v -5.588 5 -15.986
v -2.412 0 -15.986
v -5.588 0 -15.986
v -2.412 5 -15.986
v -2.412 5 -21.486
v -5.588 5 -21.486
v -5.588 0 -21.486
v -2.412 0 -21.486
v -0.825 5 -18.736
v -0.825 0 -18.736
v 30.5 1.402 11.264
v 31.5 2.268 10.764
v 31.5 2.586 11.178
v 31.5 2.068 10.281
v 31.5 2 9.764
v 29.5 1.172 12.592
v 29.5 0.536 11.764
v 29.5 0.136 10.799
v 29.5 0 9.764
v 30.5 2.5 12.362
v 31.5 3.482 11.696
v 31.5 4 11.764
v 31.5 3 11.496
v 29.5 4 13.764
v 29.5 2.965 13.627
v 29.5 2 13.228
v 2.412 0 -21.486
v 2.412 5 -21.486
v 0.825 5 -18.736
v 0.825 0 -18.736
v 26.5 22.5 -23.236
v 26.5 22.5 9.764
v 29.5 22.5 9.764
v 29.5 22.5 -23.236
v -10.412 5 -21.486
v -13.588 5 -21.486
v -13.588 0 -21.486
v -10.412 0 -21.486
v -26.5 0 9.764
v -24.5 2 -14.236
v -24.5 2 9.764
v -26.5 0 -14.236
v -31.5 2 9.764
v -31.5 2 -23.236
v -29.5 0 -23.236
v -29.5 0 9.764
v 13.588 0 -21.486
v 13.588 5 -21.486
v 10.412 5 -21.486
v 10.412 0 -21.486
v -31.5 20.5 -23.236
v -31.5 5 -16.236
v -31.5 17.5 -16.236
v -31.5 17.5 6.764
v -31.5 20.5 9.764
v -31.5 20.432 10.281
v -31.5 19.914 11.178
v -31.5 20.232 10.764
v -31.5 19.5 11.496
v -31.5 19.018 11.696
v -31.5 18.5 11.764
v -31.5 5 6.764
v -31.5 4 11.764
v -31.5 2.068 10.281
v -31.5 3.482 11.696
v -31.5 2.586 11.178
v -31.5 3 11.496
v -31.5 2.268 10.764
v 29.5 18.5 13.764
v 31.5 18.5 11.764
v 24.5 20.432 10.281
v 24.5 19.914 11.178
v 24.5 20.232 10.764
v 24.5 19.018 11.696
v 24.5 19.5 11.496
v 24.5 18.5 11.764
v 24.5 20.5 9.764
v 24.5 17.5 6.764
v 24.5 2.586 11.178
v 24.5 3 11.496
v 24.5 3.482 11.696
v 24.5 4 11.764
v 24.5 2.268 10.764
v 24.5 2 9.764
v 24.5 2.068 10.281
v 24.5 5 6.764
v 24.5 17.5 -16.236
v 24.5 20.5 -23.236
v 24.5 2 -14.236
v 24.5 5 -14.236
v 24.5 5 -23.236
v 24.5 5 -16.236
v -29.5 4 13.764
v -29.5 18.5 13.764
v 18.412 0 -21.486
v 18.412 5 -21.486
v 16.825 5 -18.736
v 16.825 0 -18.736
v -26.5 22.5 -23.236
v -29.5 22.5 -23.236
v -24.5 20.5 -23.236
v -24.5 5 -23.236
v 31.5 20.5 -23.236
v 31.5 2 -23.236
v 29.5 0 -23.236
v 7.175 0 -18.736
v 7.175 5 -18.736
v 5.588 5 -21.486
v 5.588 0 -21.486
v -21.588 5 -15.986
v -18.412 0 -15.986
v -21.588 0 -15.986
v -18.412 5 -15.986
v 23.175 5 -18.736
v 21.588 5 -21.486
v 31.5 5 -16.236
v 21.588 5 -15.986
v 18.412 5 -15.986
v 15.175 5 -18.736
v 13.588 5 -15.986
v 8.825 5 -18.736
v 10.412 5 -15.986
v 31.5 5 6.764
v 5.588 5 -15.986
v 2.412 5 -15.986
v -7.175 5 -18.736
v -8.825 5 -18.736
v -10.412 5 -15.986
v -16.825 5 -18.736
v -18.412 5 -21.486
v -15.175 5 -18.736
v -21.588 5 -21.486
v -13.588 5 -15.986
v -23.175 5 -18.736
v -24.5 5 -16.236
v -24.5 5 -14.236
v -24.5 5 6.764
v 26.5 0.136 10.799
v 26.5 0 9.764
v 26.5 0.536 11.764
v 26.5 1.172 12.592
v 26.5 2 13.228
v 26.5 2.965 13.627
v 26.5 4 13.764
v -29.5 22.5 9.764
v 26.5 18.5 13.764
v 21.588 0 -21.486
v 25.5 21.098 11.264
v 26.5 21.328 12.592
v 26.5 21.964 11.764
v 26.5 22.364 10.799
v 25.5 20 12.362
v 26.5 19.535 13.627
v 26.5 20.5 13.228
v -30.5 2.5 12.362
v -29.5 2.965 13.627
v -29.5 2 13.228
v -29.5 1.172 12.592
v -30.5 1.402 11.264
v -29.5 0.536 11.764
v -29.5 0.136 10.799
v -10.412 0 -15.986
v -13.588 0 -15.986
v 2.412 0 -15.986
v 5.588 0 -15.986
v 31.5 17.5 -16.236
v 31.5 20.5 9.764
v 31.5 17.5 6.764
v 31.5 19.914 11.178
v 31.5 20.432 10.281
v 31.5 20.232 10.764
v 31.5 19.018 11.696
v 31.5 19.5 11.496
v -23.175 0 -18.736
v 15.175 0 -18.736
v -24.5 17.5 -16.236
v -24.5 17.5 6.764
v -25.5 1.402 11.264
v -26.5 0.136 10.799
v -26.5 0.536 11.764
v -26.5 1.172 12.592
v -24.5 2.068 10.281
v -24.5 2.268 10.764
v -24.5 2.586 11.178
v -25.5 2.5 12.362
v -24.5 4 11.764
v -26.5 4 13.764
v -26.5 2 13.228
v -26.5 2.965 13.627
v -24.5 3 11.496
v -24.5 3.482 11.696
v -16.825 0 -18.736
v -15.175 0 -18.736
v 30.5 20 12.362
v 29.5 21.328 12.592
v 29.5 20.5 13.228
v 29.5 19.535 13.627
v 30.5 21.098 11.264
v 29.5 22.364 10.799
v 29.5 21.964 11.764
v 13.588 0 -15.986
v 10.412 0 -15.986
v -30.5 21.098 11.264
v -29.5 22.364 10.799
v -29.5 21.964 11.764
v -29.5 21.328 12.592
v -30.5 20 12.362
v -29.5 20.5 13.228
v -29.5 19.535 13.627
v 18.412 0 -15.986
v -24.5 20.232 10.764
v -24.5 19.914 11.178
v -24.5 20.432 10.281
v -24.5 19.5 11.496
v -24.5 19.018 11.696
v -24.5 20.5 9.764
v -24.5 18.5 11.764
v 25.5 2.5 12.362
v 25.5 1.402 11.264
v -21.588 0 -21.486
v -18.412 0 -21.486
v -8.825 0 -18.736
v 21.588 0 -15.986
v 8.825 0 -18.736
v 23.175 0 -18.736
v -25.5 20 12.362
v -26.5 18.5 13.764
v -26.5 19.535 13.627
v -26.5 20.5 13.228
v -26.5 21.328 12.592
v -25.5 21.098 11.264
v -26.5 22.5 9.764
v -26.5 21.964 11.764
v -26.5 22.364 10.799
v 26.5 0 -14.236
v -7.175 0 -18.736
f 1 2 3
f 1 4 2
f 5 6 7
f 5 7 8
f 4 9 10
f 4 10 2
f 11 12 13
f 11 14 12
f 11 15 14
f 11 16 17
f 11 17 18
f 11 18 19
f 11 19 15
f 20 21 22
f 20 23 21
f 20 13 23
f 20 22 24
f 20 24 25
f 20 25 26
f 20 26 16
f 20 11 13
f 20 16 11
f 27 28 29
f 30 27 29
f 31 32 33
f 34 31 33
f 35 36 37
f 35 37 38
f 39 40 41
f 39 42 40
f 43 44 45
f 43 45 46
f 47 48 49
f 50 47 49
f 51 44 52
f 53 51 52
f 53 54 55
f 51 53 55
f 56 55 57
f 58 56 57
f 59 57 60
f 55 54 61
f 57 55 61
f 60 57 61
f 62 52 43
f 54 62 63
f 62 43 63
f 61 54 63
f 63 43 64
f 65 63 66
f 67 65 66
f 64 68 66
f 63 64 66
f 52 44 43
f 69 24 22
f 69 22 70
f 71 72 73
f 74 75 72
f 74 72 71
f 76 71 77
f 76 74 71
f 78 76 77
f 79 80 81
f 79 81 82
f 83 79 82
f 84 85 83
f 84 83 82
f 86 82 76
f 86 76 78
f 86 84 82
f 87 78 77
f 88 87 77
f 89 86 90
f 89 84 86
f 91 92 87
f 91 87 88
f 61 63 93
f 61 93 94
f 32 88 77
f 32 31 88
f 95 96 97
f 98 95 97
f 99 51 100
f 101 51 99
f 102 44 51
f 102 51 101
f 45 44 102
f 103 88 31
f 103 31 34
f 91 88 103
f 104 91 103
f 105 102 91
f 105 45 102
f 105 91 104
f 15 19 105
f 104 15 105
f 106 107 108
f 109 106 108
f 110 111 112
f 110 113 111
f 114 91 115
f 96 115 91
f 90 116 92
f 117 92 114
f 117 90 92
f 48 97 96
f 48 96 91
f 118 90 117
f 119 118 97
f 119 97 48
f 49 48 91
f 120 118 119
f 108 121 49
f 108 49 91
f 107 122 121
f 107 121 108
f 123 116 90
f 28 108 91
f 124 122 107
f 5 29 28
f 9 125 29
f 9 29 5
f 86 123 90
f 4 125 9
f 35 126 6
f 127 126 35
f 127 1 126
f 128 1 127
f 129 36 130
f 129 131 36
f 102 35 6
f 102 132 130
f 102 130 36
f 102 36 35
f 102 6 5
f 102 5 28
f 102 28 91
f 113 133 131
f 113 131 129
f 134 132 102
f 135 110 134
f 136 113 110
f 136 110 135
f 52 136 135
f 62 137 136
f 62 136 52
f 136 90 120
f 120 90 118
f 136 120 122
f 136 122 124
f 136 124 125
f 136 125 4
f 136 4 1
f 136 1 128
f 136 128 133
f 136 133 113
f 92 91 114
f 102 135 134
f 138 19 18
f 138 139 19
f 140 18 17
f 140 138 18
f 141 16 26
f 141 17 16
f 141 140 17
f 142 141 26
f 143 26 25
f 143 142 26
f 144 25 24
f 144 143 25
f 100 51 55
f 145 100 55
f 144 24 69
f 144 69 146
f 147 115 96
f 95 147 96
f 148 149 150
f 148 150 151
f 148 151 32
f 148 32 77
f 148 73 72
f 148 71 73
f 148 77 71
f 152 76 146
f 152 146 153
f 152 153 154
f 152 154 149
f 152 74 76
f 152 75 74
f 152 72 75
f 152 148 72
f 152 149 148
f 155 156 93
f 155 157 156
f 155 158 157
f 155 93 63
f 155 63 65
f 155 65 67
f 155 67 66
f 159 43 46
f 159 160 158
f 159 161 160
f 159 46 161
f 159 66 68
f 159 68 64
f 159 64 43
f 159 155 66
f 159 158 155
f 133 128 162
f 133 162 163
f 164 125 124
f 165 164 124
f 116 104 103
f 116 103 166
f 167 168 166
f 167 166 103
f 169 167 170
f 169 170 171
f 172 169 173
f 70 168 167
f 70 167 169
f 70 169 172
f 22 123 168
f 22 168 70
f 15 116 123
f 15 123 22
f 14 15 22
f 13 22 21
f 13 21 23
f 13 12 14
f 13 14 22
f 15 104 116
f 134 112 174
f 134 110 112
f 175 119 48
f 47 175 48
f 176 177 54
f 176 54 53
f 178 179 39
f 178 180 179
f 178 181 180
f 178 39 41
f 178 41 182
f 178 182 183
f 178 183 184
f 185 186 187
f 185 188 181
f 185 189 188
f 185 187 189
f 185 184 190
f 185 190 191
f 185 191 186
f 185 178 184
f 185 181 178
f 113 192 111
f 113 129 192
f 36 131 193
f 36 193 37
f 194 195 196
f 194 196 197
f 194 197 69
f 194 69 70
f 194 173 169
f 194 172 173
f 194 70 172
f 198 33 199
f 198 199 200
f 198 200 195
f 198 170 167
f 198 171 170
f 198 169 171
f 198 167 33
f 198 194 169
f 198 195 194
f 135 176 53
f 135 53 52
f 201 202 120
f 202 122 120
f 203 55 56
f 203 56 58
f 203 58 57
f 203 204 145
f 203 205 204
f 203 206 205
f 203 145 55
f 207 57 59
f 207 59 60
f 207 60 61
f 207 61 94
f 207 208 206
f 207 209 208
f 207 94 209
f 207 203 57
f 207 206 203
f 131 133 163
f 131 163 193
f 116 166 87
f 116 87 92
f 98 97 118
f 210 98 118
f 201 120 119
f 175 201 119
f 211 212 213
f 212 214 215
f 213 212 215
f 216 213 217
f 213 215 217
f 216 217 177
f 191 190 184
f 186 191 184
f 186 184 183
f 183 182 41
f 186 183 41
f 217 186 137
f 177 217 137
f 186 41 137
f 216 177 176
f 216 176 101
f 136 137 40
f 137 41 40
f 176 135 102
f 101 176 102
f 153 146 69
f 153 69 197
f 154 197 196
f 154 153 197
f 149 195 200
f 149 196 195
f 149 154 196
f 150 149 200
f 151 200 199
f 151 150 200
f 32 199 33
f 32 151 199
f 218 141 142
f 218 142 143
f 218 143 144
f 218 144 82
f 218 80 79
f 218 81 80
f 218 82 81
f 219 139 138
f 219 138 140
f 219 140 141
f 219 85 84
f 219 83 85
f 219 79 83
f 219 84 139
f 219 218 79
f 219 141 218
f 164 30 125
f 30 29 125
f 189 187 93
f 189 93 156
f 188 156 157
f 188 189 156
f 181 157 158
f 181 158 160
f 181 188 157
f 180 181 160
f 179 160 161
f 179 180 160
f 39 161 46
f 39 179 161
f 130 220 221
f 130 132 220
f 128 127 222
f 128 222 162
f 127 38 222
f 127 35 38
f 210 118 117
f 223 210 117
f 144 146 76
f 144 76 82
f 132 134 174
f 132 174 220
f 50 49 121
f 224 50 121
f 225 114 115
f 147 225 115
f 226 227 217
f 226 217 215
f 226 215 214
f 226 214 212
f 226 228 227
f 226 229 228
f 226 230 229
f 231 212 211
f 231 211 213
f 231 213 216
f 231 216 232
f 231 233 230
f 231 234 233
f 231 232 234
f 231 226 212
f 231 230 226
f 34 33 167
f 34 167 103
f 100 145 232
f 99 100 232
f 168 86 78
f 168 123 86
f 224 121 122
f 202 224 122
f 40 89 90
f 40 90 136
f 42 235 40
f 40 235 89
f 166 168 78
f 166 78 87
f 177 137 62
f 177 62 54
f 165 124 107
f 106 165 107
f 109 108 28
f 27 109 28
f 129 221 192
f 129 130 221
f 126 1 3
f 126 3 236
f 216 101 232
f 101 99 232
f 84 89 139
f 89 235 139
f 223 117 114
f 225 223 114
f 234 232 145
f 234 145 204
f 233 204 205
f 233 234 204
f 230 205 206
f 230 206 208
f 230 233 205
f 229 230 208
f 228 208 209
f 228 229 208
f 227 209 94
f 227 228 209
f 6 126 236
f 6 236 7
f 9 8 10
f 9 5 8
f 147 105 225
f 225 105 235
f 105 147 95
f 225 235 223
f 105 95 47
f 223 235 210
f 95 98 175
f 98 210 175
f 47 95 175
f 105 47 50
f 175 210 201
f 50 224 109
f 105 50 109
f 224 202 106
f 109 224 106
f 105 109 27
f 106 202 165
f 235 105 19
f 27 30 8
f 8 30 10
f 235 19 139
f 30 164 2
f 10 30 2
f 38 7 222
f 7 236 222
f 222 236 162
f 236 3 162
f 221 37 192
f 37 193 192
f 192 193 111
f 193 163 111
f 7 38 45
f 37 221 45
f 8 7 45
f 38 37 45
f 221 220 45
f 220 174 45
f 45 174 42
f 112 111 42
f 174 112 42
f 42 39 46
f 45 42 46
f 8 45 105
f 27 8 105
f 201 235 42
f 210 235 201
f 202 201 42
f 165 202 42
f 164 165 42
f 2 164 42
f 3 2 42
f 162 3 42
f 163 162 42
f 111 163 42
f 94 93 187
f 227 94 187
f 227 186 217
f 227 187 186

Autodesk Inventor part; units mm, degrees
ref_plane "YZ Plane" through (0, 0, 0) normal (1, 0, 0) x (0, 1, 0)
ref_plane "XZ Plane" through (0, 0, 0) normal (0, 1, 0) x (-1, 0, 0)
ref_plane "XY Plane" through (0, 0, 0) normal (0, 0, 1) x (1, 0, 0)
sketch "Boceto1" plane through (0, 0, 0) normal (0, 1, 0) x (-1, 0, 0)
  line L0 (29.505, -15) -> (44.5466, 0) construction
  line L1 (33.6552, -19.1617) -> (29.505, -15) construction
  line L2 (0, 0) -> (0, 6.3504) construction
  line L3 (0, 0) -> (0, -23.2363) construction
  line L4 (0, -14.2363) -> (24.5, -14.2363)
  line L5 (31.5, -23.2363) -> (31.5, 13.7637)
  line L6 (31.5, 13.7637) -> (24.5, 13.7637)
  line L7 (24.5, 13.7637) -> (24.5, -14.2363)
  line L8 (31.5, -23.2363) -> (0, -23.2363)
  line L9 (0, -14.2363) -> (-24.5, -14.2363)
  line L10 (-31.5, -23.2363) -> (-31.5, 13.7637)
  line L11 (-31.5, 13.7637) -> (-24.5, 13.7637)
  line L12 (-24.5, 13.7637) -> (-24.5, -14.2363)
  line L13 (-31.5, -23.2363) -> (0, -23.2363)
  dimension "d70" = 7
  dimension "d71" = 37
  dimension "d86" = 31.5
  dimension "d88" = 9
extrude "Extrusión1" add sketch "Boceto1" along normal blind 5
sketch "Boceto11" plane through (0, 5, 0) normal (0, 1, 0) x (1, 0, 0)
  line L0 (-31.5, -13.7637) -> (-24.5, -13.7637) projected
  line L1 (31.5, 23.2363) -> (-31.5, 23.2363) projected
  line L2 (-31.5, -13.7637) -> (-24.5, -13.7637)
  line L3 (-24.5, -13.7637) -> (-24.5, 23.2363)
  line L4 (-24.5, 23.2363) -> (-31.5, 23.2363)
  line L5 (-31.5, 23.2363) -> (-31.5, -13.7637)
  line L6 (0, 0) -> (0, -8.2135) construction
  line L7 (31.5, -13.7637) -> (24.5, -13.7637)
  line L8 (24.5, -13.7637) -> (24.5, 23.2363)
  line L9 (24.5, 23.2363) -> (31.5, 23.2363)
  line L10 (31.5, 23.2363) -> (31.5, -13.7637)
  point P0 (31.5, 23.2363)
  point P1 (24.5, 23.2363)
extrude "Extrusión7" add sketch "Boceto11" along normal blind 17.5
sketch "Boceto12" plane through (31.5, 0, 13.7637) normal (1, 0, 0) x (0, 0, -1)
  line L0 (7, 17.5) -> (30, 17.5)
  line L1 (30, 17.5) -> (30, 5)
  line L2 (30, 5) -> (7, 5)
  line L3 (7, 5) -> (7, 17.5)
  line L4 (37, 22.5) -> (0, 22.5) projected
  line L5 (18.5, 22.5) -> (18.5, 29.9213) construction
  line L6 (0, 0) -> (0, 22.5) projected
  line L7 (0, 11.25) -> (-3.0724, 11.25) construction
  point P0 (13.7637, 0)
  dimension "d74" = 12.5
  dimension "d75" = 23
extrude "Extrusión8" cut sketch "Boceto12" against normal through all
fillet "Empalme5" radius 4 4 edges at (-28, 0, 13.7637) (-28, 22.5, 13.7637) (28, 0, 13.7637) (28, 22.5, 13.7637)
chamfer "Chaflán3" distance 2 angle 45 20 edges at (31.5, 22.5, -6.7363) (31.5, 21.3284, 12.5921) (31.5, 11.25, 13.7637) (31.5, 1.1716, 12.5921) (31.5, 0, -6.7363) (-31.5, 22.5, -6.7363) (-31.5, 21.3284, 12.5921) (-31.5, 11.25, 13.7637) (-31.5, 1.1716, 12.5921) (-31.5, 0, -6.7363) (-24.5, 22.5, -6.7363) (-24.5, 21.3284, 12.5921) (-24.5, 11.25, 13.7637) (-24.5, 1.1716, 12.5921) (-24.5, 0, -2.2363) (24.5, 22.5, -6.7363) (24.5, 21.3284, 12.5921) (24.5, 11.25, 13.7637) (24.5, 1.1716, 12.5921) (24.5, 0, -2.2363)
sketch "Boceto13" plane through (0, 5, 0) normal (0, 1, 0) x (1, 0, 0)
  line L0 (0, 0) -> (0, -6.0566) construction
  line L1 (-2.4123, 15.9863) -> (-5.5877, 15.9863)
  line L2 (-5.5877, 15.9863) -> (-7.1754, 18.7363)
  line L3 (-7.1754, 18.7363) -> (-5.5877, 21.4863)
  line L4 (-5.5877, 21.4863) -> (-2.4123, 21.4863)
  line L5 (-2.4123, 21.4863) -> (-0.8246, 18.7363)
  line L6 (-0.8246, 18.7363) -> (-2.4123, 15.9863)
  line L7 (24.5, 23.2363) -> (-24.5, 23.2363) projected
  line L8 (-13.5877, 21.4863) -> (-10.4123, 21.4863)
  line L9 (-15.1754, 18.7363) -> (-13.5877, 21.4863)
  line L10 (-13.5877, 15.9863) -> (-15.1754, 18.7363)
  line L11 (-10.4123, 15.9863) -> (-13.5877, 15.9863)
  line L12 (-8.8246, 18.7363) -> (-10.4123, 15.9863)
  line L13 (-10.4123, 21.4863) -> (-8.8246, 18.7363)
  line L14 (-21.5877, 21.4863) -> (-18.4123, 21.4863)
  line L15 (-23.1754, 18.7363) -> (-21.5877, 21.4863)
  line L16 (-21.5877, 15.9863) -> (-23.1754, 18.7363)
  line L17 (-18.4123, 15.9863) -> (-21.5877, 15.9863)
  line L18 (-16.8246, 18.7363) -> (-18.4123, 15.9863)
  line L19 (-18.4123, 21.4863) -> (-16.8246, 18.7363)
  line L20 (2.4123, 15.9863) -> (5.5877, 15.9863)
  line L21 (5.5877, 15.9863) -> (7.1754, 18.7363)
  line L22 (7.1754, 18.7363) -> (5.5877, 21.4863)
  line L23 (5.5877, 21.4863) -> (2.4123, 21.4863)
  line L24 (2.4123, 21.4863) -> (0.8246, 18.7363)
  line L25 (0.8246, 18.7363) -> (2.4123, 15.9863)
  line L26 (13.5877, 21.4863) -> (10.4123, 21.4863)
  line L27 (15.1754, 18.7363) -> (13.5877, 21.4863)
  line L28 (13.5877, 15.9863) -> (15.1754, 18.7363)
  line L29 (10.4123, 15.9863) -> (13.5877, 15.9863)
  line L30 (8.8246, 18.7363) -> (10.4123, 15.9863)
  line L31 (10.4123, 21.4863) -> (8.8246, 18.7363)
  line L32 (21.5877, 21.4863) -> (18.4123, 21.4863)
  line L33 (23.1754, 18.7363) -> (21.5877, 21.4863)
  line L34 (21.5877, 15.9863) -> (23.1754, 18.7363)
  line L35 (18.4123, 15.9863) -> (21.5877, 15.9863)
  line L36 (16.8246, 18.7363) -> (18.4123, 15.9863)
  line L37 (18.4123, 21.4863) -> (16.8246, 18.7363)
  point P0 (-4, 18.7363)
  dimension "d87" = 5.5
  dimension "d89" = 4.5
  dimension "d90" = 4
  dimension "d93" = 8
extrude "Extrusión9" cut sketch "Boceto13" against normal up to surface (5 mm away)
properties part number "Chassis_atras_V4"
